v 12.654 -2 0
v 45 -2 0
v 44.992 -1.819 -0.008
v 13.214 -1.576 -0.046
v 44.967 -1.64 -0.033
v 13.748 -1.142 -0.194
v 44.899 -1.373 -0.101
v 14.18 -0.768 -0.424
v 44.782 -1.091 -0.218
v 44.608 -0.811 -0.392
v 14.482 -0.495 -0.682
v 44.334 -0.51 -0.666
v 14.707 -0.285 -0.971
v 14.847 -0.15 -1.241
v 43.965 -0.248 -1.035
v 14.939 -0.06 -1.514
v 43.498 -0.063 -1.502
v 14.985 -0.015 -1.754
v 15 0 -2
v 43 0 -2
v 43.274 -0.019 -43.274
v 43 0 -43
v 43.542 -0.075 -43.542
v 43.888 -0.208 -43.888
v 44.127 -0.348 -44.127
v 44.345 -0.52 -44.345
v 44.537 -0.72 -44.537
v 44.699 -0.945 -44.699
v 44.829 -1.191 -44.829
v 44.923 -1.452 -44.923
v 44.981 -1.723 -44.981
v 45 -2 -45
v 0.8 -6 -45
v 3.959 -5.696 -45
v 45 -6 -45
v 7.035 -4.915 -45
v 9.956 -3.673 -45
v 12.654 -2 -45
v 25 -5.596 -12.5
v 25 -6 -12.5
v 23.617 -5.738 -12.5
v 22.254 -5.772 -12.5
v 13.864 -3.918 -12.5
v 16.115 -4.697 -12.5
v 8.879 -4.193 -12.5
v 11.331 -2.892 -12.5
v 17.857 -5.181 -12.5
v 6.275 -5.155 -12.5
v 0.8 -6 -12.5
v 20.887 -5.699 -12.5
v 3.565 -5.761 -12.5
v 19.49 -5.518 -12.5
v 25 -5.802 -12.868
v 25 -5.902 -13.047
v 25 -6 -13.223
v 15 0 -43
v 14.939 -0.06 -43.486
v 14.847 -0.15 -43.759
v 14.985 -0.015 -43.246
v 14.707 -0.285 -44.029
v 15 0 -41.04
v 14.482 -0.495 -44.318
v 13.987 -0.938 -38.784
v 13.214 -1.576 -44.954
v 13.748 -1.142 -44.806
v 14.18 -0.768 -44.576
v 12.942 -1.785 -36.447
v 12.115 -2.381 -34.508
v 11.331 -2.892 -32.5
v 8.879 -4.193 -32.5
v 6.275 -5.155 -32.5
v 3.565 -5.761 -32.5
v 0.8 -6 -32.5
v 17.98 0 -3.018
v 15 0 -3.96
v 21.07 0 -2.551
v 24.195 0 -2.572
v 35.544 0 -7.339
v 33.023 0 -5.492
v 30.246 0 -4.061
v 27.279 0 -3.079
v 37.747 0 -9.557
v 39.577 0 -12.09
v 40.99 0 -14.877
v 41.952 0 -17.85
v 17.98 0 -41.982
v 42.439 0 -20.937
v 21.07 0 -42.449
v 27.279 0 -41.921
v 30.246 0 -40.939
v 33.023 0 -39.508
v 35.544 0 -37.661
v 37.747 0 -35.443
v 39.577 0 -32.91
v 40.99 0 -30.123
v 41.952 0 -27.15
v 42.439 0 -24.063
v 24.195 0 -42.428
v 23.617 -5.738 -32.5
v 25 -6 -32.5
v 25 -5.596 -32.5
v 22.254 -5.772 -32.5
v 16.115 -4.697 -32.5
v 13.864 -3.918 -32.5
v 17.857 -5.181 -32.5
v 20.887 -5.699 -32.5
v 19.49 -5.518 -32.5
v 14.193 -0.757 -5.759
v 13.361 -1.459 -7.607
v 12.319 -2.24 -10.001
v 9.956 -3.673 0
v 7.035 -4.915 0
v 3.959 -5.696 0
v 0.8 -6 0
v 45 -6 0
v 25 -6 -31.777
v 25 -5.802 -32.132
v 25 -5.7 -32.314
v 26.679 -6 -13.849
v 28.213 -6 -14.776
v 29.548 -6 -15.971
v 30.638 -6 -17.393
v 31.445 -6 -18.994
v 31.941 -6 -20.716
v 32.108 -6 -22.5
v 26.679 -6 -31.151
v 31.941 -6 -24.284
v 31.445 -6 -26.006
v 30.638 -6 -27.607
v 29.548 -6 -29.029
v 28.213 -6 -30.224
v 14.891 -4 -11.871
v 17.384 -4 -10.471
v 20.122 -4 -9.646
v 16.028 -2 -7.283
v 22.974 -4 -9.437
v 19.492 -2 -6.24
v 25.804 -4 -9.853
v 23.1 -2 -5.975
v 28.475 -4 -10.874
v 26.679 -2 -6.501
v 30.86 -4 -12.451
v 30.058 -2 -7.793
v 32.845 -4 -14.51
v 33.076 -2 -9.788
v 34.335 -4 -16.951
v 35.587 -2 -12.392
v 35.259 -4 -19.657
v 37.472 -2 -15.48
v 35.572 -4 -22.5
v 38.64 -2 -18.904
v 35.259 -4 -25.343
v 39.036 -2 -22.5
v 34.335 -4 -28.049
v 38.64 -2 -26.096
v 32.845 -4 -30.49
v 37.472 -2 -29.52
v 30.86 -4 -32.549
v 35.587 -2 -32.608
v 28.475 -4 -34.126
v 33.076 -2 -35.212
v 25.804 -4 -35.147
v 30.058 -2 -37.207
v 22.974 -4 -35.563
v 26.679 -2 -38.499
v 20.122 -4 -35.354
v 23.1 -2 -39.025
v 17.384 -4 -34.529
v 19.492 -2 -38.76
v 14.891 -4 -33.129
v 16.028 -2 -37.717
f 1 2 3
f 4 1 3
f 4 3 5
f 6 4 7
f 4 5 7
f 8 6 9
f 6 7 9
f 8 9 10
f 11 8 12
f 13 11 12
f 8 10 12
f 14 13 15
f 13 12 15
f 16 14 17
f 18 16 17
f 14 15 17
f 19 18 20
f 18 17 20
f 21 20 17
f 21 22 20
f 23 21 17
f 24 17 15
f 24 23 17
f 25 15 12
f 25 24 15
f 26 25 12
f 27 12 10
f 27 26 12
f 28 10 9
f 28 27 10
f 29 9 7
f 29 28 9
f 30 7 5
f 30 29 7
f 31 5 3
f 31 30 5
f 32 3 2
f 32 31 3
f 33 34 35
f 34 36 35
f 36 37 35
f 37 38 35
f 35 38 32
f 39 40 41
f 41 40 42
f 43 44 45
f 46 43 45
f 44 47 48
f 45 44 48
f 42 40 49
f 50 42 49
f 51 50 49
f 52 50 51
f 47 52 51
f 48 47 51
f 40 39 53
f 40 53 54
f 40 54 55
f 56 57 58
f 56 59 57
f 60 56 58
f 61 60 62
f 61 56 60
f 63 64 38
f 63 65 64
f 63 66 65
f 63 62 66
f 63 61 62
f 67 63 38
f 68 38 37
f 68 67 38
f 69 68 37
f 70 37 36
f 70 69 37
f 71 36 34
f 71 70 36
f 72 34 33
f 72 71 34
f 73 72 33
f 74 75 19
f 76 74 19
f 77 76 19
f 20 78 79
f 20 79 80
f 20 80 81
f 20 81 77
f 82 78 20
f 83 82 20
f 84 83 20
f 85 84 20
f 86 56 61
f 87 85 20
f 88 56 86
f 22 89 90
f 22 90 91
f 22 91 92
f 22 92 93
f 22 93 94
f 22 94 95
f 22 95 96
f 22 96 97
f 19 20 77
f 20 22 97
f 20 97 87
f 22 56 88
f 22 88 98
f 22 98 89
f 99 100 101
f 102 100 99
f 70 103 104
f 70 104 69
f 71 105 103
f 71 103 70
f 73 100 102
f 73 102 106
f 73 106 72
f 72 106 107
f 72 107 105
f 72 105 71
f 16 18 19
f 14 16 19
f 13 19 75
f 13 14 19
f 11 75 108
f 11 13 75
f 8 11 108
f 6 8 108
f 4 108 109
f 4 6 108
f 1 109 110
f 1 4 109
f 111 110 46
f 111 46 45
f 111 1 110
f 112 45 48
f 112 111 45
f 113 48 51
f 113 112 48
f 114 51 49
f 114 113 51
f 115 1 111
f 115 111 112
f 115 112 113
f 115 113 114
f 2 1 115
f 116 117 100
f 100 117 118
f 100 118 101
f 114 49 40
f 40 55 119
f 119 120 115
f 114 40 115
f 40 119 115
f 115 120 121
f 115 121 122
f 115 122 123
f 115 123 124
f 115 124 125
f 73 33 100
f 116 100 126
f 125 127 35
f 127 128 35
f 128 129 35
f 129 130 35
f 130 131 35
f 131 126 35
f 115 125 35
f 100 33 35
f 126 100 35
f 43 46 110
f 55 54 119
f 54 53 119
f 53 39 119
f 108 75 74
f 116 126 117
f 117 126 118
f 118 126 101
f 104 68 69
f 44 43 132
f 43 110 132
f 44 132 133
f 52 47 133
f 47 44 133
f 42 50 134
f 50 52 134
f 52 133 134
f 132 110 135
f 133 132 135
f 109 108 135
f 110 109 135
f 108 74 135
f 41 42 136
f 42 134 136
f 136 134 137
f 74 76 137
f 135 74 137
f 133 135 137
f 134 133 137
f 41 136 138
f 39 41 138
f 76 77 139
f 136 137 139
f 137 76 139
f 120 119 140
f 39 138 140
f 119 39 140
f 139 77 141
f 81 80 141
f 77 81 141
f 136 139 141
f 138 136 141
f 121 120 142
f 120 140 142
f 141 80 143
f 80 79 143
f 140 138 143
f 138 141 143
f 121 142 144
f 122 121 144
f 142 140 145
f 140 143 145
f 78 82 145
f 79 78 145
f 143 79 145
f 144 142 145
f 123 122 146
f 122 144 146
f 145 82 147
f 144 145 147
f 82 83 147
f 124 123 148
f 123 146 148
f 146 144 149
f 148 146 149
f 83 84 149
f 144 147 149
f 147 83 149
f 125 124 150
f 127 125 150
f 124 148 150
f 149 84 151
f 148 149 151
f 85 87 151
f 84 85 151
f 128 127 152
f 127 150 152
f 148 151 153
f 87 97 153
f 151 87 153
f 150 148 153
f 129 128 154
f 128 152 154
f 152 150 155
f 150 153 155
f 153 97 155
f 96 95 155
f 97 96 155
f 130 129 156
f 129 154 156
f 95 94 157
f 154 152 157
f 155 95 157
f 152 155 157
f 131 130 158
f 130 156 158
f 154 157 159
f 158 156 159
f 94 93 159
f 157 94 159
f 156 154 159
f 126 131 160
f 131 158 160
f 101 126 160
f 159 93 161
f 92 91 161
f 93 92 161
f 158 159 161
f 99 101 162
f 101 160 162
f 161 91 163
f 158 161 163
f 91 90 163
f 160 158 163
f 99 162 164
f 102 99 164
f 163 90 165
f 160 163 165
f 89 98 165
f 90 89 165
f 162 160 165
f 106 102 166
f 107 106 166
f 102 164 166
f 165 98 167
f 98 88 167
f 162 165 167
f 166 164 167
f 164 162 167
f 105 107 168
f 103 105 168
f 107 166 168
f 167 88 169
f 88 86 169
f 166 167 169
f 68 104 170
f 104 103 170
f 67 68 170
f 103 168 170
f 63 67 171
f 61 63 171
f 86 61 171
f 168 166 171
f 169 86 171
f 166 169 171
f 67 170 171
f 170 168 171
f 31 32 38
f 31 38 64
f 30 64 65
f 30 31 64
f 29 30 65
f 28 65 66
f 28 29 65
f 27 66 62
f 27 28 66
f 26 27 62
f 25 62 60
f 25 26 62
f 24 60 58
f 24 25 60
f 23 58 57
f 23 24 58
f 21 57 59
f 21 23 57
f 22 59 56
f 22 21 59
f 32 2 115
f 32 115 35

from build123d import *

# Parameters (mm, degrees)
SKETCH1_W           = 45
SKETCH1_H           = 45
BOSS_EXTRUDE1_DEPTH = 6
SKETCH2_R           = 20
CUT_EXTRUDE1_DEPTH  = 6
CUT_EXTRUDE1_DRAFT  = -60
FILLET2_R           = 2
CUT_EXTRUDE2_DEPTH  = 1000
SKETCH5_W           = 20
SKETCH5_H           = 6
CUT_EXTRUDE3_DEPTH  = 25


with BuildPart() as part:
    # Sketch1 → Boss-Extrude1 (new body)
    with BuildSketch(Plane(origin=(0, 0, 0), x_dir=(1, 0, 0), z_dir=(0, 1, 0))):
        with Locations((22.5, 22.5)):
            Rectangle(SKETCH1_W, SKETCH1_H)
    extrude(amount=-BOSS_EXTRUDE1_DEPTH)


with BuildPart() as cut_extrude1_tool:
    # Sketch2 → Cut-Extrude1 (with draft: the straight prism first)
    with BuildSketch(Plane(origin=(0, 0, 0), x_dir=(1, 0, 0), z_dir=(0, 1, 0))):
        with Locations((22.5, 22.5)):
            Circle(SKETCH2_R)
    extrude(amount=-CUT_EXTRUDE1_DEPTH)
    # Cut-Extrude1: the draft: its side faces are tilted about the plane it starts from
    cut_extrude1_sides = [cut_extrude1_tool.faces().sort_by_distance(p)[0] for p in [
        (2.5, -3, -22.5),
    ]]
    draft(cut_extrude1_sides, Plane(origin=(0, 0, 0), x_dir=(1, 0, 0), z_dir=(0, 1, 0)), CUT_EXTRUDE1_DRAFT)


with BuildPart() as part_1:
    add(part.part)

    # Cut-Extrude1: cut by cut_extrude1_tool
    add(cut_extrude1_tool.part, mode=Mode.SUBTRACT)

    # Fillet2
    fillet2_edges = [part_1.edges().sort_by_distance(p)[0] for p in [
        (22.5, 0, -45),
        (45, 0, -22.5),
        (22.5, 0, 0),
    ]]
    fillet(fillet2_edges, radius=FILLET2_R)

    # Sketch4 → Cut-Extrude2 (cut)
    with BuildSketch(Plane.XY):
        with BuildLine():
            Line((0, 0), (15, 0))
            ThreePointArc((15, 0), (8.107772818, -4.519432044), (0, -6))
            Line((0, -6), (0, 0))
        make_face()
    extrude(amount=-CUT_EXTRUDE2_DEPTH, mode=Mode.SUBTRACT)

    # Sketch5 → Cut-Extrude3 (cut)
    with BuildSketch(Plane(origin=(0, 0, 0), x_dir=(0, 0, -1), z_dir=(1, 0, 0))):
        with Locations((22.5, -3)):
            Rectangle(SKETCH5_W, SKETCH5_H)
    extrude(amount=CUT_EXTRUDE3_DEPTH, mode=Mode.SUBTRACT)


solid = part_1.part
